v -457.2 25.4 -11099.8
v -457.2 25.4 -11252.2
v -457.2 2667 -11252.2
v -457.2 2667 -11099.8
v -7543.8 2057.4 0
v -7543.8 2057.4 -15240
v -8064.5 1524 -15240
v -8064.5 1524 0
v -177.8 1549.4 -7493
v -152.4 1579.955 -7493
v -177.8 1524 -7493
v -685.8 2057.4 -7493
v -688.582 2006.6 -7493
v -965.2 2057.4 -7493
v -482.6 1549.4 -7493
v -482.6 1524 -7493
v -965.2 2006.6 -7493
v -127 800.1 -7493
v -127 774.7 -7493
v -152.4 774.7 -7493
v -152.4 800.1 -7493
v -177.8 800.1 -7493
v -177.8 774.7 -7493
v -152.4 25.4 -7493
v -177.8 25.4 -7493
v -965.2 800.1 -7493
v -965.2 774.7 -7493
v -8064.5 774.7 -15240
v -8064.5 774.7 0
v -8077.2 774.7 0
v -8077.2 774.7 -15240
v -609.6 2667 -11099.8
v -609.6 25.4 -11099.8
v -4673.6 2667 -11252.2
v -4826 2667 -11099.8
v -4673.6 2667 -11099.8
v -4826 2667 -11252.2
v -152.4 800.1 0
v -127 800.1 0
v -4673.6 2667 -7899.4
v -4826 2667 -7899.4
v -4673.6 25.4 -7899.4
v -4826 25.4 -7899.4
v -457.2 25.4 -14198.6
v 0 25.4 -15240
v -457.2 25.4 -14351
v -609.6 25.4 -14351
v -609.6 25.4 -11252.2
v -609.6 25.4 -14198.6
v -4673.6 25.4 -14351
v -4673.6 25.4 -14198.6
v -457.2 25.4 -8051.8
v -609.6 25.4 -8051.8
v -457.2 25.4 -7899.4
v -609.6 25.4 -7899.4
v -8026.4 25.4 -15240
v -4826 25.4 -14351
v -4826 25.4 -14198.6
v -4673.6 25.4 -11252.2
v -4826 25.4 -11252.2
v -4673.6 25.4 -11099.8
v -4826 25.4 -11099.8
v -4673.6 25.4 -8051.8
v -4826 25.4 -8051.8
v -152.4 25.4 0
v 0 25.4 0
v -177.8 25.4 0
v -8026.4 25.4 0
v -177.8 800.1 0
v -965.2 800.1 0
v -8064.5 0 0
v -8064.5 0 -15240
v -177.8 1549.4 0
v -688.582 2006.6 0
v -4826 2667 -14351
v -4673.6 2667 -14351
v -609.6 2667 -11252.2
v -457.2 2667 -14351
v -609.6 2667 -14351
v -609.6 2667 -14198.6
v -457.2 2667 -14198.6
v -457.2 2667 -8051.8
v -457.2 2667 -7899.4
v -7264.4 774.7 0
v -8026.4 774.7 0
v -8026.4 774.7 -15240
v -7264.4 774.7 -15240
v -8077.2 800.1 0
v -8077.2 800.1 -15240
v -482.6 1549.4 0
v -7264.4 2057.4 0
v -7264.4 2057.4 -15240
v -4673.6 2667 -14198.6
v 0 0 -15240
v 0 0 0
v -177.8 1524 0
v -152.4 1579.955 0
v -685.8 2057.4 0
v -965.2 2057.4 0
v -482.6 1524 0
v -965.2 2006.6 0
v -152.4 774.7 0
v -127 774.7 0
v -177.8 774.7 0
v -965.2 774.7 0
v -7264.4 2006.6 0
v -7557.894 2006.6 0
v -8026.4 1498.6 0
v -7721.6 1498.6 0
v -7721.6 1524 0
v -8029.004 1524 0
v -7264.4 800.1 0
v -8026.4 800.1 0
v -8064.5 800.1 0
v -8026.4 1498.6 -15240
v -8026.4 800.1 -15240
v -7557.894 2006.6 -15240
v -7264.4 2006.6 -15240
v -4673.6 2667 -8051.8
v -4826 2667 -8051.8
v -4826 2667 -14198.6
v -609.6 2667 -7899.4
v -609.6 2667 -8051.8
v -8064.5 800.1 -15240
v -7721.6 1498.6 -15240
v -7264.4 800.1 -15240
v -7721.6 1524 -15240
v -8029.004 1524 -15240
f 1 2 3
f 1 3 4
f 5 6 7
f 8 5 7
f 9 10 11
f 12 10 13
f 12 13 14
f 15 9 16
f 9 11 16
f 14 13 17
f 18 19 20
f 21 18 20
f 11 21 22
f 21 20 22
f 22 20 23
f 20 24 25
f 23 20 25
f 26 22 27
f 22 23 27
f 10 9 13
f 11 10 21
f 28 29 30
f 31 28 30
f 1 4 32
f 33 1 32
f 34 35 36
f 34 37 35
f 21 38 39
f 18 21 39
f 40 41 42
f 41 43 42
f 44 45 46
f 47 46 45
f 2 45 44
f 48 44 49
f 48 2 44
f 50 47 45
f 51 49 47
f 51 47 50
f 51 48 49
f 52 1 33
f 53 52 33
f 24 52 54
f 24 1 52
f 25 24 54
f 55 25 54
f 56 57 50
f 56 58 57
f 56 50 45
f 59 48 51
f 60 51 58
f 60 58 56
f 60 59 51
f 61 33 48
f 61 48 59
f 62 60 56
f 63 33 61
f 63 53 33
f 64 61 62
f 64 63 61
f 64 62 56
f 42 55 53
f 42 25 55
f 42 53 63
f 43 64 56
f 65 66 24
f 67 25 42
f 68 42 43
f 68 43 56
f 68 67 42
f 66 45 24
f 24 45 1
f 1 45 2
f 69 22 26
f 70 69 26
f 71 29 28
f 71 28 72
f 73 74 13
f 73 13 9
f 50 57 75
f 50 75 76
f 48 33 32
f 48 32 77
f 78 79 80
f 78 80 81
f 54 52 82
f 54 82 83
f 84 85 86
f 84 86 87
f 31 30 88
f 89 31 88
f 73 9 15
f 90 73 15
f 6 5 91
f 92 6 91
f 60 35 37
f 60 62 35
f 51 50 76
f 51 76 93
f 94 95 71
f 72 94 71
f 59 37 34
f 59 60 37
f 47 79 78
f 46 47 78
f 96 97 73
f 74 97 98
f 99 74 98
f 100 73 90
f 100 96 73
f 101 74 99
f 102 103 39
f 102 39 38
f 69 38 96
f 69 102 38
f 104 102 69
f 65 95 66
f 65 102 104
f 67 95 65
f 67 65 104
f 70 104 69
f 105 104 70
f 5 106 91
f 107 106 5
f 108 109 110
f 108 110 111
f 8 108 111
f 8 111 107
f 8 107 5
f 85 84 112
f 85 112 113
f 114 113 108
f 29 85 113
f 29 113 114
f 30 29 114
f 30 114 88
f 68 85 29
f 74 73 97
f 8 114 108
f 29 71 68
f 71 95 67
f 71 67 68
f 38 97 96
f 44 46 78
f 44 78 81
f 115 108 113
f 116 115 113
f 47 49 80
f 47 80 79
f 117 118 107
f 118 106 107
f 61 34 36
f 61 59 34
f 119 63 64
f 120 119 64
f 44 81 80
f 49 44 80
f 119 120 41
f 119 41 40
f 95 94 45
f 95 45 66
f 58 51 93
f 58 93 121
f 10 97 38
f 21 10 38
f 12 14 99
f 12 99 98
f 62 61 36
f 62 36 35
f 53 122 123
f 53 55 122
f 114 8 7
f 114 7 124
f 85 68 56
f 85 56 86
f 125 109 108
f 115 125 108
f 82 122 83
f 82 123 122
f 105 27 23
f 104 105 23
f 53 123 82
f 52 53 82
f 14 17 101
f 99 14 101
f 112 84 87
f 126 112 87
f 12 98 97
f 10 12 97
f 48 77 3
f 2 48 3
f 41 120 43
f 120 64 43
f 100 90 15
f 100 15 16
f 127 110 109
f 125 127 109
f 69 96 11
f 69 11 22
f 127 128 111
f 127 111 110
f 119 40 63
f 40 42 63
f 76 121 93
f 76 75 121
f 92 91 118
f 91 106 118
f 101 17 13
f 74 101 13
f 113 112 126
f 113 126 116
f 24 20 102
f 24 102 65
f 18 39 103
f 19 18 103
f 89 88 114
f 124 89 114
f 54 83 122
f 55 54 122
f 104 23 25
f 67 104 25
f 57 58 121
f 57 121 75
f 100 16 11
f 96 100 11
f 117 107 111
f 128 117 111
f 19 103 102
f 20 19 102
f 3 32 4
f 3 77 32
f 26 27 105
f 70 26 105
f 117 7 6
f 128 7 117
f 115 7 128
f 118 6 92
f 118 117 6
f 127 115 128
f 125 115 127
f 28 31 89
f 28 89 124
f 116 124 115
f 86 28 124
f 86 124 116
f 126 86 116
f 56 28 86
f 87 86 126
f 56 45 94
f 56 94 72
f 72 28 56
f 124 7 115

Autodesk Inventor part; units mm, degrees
ref_plane "YZ Plane" through (0, 0, 0) normal (1, 0, 0) x (0, 1, 0)
ref_plane "XZ Plane" through (0, 0, 0) normal (0, 1, 0) x (-1, 0, 0)
ref_plane "XY Plane" through (0, 0, 0) normal (0, 0, 1) x (1, 0, 0)
sketch "Sketch1" plane through (0, 0, 0) normal (0, 1, 0) x (-1, 0, 0)
  line L0 (0, 0) -> (8229.6, 0)
  line L1 (8229.6, 0) -> (8229.6, -15240)
  line L2 (8229.6, -15240) -> (0, -15240)
  line L3 (0, -15240) -> (0, 0)
  line L4 (533.4, -7975.6) -> (533.4, -11176) construction
  line L5 (533.4, -11176) -> (533.4, -14274.8) construction
  line L6 (4749.8, -7975.6) -> (4749.8, -11176) construction
  line L7 (4749.8, -11176) -> (4749.8, -14274.8) construction
  line L8 (4749.8, -14274.8) -> (533.4, -14274.8) construction
  line L9 (4749.8, -7975.6) -> (533.4, -7975.6) construction
  line L10 (533.4, -11176) -> (4749.8, -11176) construction
  dimension "d0" = 15240
  dimension "d1" = 8229.6
  dimension "d2" = 3200.4
  dimension "d3" = 3098.8
  dimension "d4" = 4216.4
  dimension "d5" = 533.4
  dimension "d6" = 965.2
extrude "Extrusion1" add sketch "Sketch1" along normal blind 25.4
sketch "Sketch2" plane through (0, 25.4, 0) normal (0, 1, 0) x (1, 0, 0)
  line L0 (-4673.6, 8051.8) -> (-4826, 8051.8)
  line L1 (-4826, 8051.8) -> (-4826, 7899.4)
  line L2 (-4826, 7899.4) -> (-4673.6, 7899.4)
  line L3 (-4673.6, 7899.4) -> (-4673.6, 8051.8)
  line L4 (-4673.6, 8051.8) -> (-4826, 7899.4) construction
  line L5 (-4826, 8051.8) -> (-4673.6, 7899.4) construction
  line L6 (-457.2, 7899.4) -> (-609.6, 7899.4)
  line L7 (-609.6, 7899.4) -> (-609.6, 8051.8)
  line L8 (-609.6, 8051.8) -> (-457.2, 8051.8)
  line L9 (-457.2, 8051.8) -> (-457.2, 7899.4)
  line L10 (-457.2, 7899.4) -> (-609.6, 8051.8) construction
  line L11 (-609.6, 7899.4) -> (-457.2, 8051.8) construction
  line L12 (-4673.6, 11099.8) -> (-4826, 11099.8)
  line L13 (-4826, 11099.8) -> (-4826, 11252.2)
  line L14 (-4826, 11252.2) -> (-4673.6, 11252.2)
  line L15 (-4673.6, 11252.2) -> (-4673.6, 11099.8)
  line L16 (-4673.6, 11099.8) -> (-4826, 11252.2) construction
  line L17 (-4826, 11099.8) -> (-4673.6, 11252.2) construction
  line L18 (-457.2, 11099.8) -> (-609.6, 11099.8)
  line L19 (-609.6, 11099.8) -> (-609.6, 11252.2)
  line L20 (-609.6, 11252.2) -> (-457.2, 11252.2)
  line L21 (-457.2, 11252.2) -> (-457.2, 11099.8)
  line L22 (-457.2, 11099.8) -> (-609.6, 11252.2) construction
  line L23 (-609.6, 11099.8) -> (-457.2, 11252.2) construction
  line L24 (-457.2, 14198.6) -> (-609.6, 14198.6)
  line L25 (-609.6, 14198.6) -> (-609.6, 14351)
  line L26 (-609.6, 14351) -> (-457.2, 14351)
  line L27 (-457.2, 14351) -> (-457.2, 14198.6)
  line L28 (-457.2, 14198.6) -> (-609.6, 14351) construction
  line L29 (-609.6, 14198.6) -> (-457.2, 14351) construction
  line L30 (-4673.6, 14198.6) -> (-4826, 14198.6)
  line L31 (-4826, 14198.6) -> (-4826, 14351)
  line L32 (-4826, 14351) -> (-4673.6, 14351)
  line L33 (-4673.6, 14351) -> (-4673.6, 14198.6)
  line L34 (-4673.6, 14198.6) -> (-4826, 14351) construction
  line L35 (-4826, 14198.6) -> (-4673.6, 14351) construction
  point P0 (0, 0)
  point P1 (-4749.8, 14274.8)
  point P2 (-533.4, 14274.8)
  point P3 (-533.4, 11176)
  point P4 (-4749.8, 11176)
  point P5 (-4749.8, 7975.6)
  point P6 (-533.4, 7975.6)
  dimension "d9" = 152.4
  dimension "d10" = 152.4
  dimension "d11" = 152.4
  dimension "d12" = 152.4
  dimension "d13" = 152.4
  dimension "d14" = 152.4
  dimension "d15" = 152.4
  dimension "d16" = 152.4
  dimension "d17" = 152.4
  dimension "d18" = 152.4
  dimension "d19" = 152.4
extrude "Extrusion2" add sketch "Sketch2" along normal blind 2641.6
sketch "Sketch3" plane through (0, 25.4, 0) normal (0, 1, 0) x (1, 0, 0)
  line L0 (-8229.6, 0) -> (-7264.4, 0)
  line L1 (-7264.4, 0) -> (-7264.4, 15240)
  line L2 (-7264.4, 15240) -> (-8229.6, 15240)
  line L3 (-8229.6, 15240) -> (-8229.6, 0)
  line L4 (0, 7493) -> (-965.2, 7493)
  line L5 (-965.2, 7493) -> (-965.2, 0)
  line L6 (-965.2, 0) -> (0, 0)
  line L7 (0, 0) -> (0, 7493)
  line L8 (-8229.6, 15240) -> (-8229.6, 0) projected
  line L9 (0, 15240) -> (-8229.6, 15240) projected
  line L10 (-8229.6, 0) -> (0, 0) projected
  line L11 (0, 0) -> (0, 15240) projected
  line L12 (-609.6, 7899.4) -> (-457.2, 7899.4) projected
  dimension "d22" = 965.2
  dimension "d23" = 0
  dimension "d24" = 0
  dimension "d25" = 0
  dimension "d26" = 965.2
  dimension "d27" = 0
  dimension "d28" = 406.4
  dimension "d29" = 0
extrude "Extrusion3" add sketch "Sketch3" along normal blind 2032 contours L3 L2 L1 L0 | L5 L4 L7 L6
sketch "Sketch4" plane through (-8229.6, 0, 0) normal (0, 0, 1) x (1, 0, 0)
  line L0 (685.8, 2057.4) -> (165.1, 1524)
  line L1 (165.1, 1524) -> (165.1, 774.7)
  line L2 (0, 0) -> (0, 2057.4) projected
  line L3 (165.1, 774.7) -> (152.4, 774.7)
  line L4 (152.4, 774.7) -> (152.4, 800.1)
  line L5 (152.4, 800.1) -> (165.1, 800.1)
  line L6 (165.1, 800.1) -> (165.1, 0)
  line L7 (8229.6, 0) -> (0, 0) projected
  line L8 (965.2, 25.4) -> (965.2, 2057.4) projected
  line L9 (965.2, 2006.6) -> (671.7055, 2006.6)
  line L10 (671.7055, 2006.6) -> (200.596, 1524)
  line L11 (200.596, 1524) -> (508, 1524)
  line L12 (508, 1524) -> (508, 1498.6)
  line L13 (508, 1498.6) -> (203.2, 1498.6)
  line L14 (203.2, 1498.6) -> (203.2, 774.7)
  line L15 (203.2, 774.7) -> (965.2, 774.7)
  line L16 (965.2, 800.1) -> (203.2, 800.1)
  line L17 (203.2, 0) -> (203.2, 800.1)
  line L18 (165.1, 0) -> (203.2, 0)
  line L19 (0, 2057.4) -> (965.2, 2057.4) projected
  line L20 (685.8, 2057.4) -> (965.2, 2057.4)
  line L21 (965.2, 25.4) -> (7264.4, 25.4) projected
  line L22 (965.2, 25.4) -> (203.2, 25.4)
  line L23 (8229.6, 0) -> (8229.6, 2057.4) projected
  line L24 (4114.8, 3713.7575) -> (4114.8, -1399.6684) construction
  line L25 (8229.6, 2057.4) -> (7264.4, 2057.4) projected
  line L26 (7264.4, 2057.4) -> (7543.8, 2057.4)
  line L27 (7543.8, 2057.4) -> (8077.2, 1579.9552)
  line L28 (8077.2, 1579.9552) -> (8077.2, 800.1)
  line L29 (8077.2, 800.1) -> (8102.6, 800.1)
  line L30 (8102.6, 800.1) -> (8102.6, 774.7)
  line L31 (8102.6, 774.7) -> (8077.2, 774.7)
  line L32 (8077.2, 774.7) -> (8077.2, 0)
  line L33 (7264.4, 25.4) -> (7264.4, 2057.4) projected
  line L34 (7264.4, 2057.4) -> (7264.4, 2006.6)
  line L35 (7264.4, 2006.6) -> (7541.0175, 2006.6)
  line L36 (7541.0175, 2006.6) -> (8051.8, 1549.4)
  line L37 (8051.8, 1549.4) -> (7747, 1549.4)
  line L38 (7747, 1549.4) -> (7747, 1524)
  line L39 (7747, 1524) -> (8051.8, 1524)
  line L40 (8051.8, 1524) -> (8051.8, 800.1)
  line L41 (8051.8, 800.1) -> (7264.4, 800.1)
  line L42 (7264.4, 774.7) -> (8051.8, 774.7)
  line L43 (8051.8, 774.7) -> (8051.8, 0)
  line L44 (8051.8, 0) -> (8077.2, 0)
  line L45 (0, 0) -> (8229.6, 0) projected
  line L46 (7264.4, 800.1) -> (7264.4, 774.7)
  line L47 (7264.4, 25.4) -> (8229.6, 25.4) projected
  line L48 (7264.4, 25.4) -> (8051.8, 25.4)
  line L49 (8077.2, 25.4) -> (8229.6, 25.4)
  point P0 (7620, 25.4)
  dimension "d33" = 279.4
  dimension "d34" = 152.4
  dimension "d35" = 38.1
  dimension "d36" = 25.4
  dimension "d37" = 304.8
  dimension "d38" = 25.4
  dimension "d40" = 723.9
  dimension "d41" = 25.4
  dimension "d42" = 749.3
  dimension "d43" = 12.7
  dimension "d44" = 0
  dimension "d47" = 8229.6
  dimension "d48" = 4114.8
  dimension "d49" = 50.8
  dimension "d50" = 50.8
  dimension "d51" = 279.4
  dimension "d53" = 25.4
  dimension "d55" = 25.4
  dimension "d56" = 749.3
  dimension "d57" = 723.9
  dimension "d61" = 25.4
  dimension "d62" = 0
  dimension "d65" = 304.8
  dimension "d66" = 152.4
  dimension "d67" = 25.4
  dimension "d68" = 25.4
  dimension "d69" = 0
extrude "Extrusion4" cut sketch "Sketch4" against normal up to surface (15240 mm away) contours L0 L1 L5 L4 L3 L6 L7 L2 L19 | L8 L16 L14 L13 L12 L11 L10 L9 | L8 L22 L17 L15
extrude "Extrusion5" cut sketch "Sketch4" against normal up to surface (7493 mm away) contours L47 L33 L42 L43 | L32 L31 L30 L29 L28 L27 L25 L23 L47 | L33 L35 L36 L37 L38 L39 L40 L41
sketch "Sketch5" plane through (0, 25.4, 0) normal (0, 1, 0) x (1, 0, 0)
  line L0 (-1701.8, 5748.807) -> (-1701.8, 14785.8266) construction
  line L1 (0, 0) -> (0, 15240) construction
  line L2 (-4826, 8051.8) -> (-4826, 7899.4) construction
  line L3 (-4826, 7899.4) -> (-4673.6, 7899.4) construction
  point P0 (-4749.8, 7975.6)
  dimension "d71" = 76.2
  dimension "d72" = 76.2
  dimension "d73" = 3048
equation "\"d10\" = d9"
equation "\"d11\" = d10"
equation "\"d12\" = d11"
equation "\"d13\" = d11"
equation "\"d14\" = d12"
equation "\"d15\" = d10"
equation "\"d16\" = d10"
equation "\"d17\" = d15"
equation "\"d18\" = d17"
equation "\"d19\" = d17"
equation "\"d48\" = 0.5 * d47"
equation "\"d50\" = d49"
equation "\"d51\" = d33"
equation "\"d53\" = d36"
equation "\"d55\" = d41"
equation "\"d56\" = d42"
equation "\"d57\" = d40"
equation "\"d61\" = d55"
equation "\"d72\" = d71"
properties part number "ROOM_B164"
